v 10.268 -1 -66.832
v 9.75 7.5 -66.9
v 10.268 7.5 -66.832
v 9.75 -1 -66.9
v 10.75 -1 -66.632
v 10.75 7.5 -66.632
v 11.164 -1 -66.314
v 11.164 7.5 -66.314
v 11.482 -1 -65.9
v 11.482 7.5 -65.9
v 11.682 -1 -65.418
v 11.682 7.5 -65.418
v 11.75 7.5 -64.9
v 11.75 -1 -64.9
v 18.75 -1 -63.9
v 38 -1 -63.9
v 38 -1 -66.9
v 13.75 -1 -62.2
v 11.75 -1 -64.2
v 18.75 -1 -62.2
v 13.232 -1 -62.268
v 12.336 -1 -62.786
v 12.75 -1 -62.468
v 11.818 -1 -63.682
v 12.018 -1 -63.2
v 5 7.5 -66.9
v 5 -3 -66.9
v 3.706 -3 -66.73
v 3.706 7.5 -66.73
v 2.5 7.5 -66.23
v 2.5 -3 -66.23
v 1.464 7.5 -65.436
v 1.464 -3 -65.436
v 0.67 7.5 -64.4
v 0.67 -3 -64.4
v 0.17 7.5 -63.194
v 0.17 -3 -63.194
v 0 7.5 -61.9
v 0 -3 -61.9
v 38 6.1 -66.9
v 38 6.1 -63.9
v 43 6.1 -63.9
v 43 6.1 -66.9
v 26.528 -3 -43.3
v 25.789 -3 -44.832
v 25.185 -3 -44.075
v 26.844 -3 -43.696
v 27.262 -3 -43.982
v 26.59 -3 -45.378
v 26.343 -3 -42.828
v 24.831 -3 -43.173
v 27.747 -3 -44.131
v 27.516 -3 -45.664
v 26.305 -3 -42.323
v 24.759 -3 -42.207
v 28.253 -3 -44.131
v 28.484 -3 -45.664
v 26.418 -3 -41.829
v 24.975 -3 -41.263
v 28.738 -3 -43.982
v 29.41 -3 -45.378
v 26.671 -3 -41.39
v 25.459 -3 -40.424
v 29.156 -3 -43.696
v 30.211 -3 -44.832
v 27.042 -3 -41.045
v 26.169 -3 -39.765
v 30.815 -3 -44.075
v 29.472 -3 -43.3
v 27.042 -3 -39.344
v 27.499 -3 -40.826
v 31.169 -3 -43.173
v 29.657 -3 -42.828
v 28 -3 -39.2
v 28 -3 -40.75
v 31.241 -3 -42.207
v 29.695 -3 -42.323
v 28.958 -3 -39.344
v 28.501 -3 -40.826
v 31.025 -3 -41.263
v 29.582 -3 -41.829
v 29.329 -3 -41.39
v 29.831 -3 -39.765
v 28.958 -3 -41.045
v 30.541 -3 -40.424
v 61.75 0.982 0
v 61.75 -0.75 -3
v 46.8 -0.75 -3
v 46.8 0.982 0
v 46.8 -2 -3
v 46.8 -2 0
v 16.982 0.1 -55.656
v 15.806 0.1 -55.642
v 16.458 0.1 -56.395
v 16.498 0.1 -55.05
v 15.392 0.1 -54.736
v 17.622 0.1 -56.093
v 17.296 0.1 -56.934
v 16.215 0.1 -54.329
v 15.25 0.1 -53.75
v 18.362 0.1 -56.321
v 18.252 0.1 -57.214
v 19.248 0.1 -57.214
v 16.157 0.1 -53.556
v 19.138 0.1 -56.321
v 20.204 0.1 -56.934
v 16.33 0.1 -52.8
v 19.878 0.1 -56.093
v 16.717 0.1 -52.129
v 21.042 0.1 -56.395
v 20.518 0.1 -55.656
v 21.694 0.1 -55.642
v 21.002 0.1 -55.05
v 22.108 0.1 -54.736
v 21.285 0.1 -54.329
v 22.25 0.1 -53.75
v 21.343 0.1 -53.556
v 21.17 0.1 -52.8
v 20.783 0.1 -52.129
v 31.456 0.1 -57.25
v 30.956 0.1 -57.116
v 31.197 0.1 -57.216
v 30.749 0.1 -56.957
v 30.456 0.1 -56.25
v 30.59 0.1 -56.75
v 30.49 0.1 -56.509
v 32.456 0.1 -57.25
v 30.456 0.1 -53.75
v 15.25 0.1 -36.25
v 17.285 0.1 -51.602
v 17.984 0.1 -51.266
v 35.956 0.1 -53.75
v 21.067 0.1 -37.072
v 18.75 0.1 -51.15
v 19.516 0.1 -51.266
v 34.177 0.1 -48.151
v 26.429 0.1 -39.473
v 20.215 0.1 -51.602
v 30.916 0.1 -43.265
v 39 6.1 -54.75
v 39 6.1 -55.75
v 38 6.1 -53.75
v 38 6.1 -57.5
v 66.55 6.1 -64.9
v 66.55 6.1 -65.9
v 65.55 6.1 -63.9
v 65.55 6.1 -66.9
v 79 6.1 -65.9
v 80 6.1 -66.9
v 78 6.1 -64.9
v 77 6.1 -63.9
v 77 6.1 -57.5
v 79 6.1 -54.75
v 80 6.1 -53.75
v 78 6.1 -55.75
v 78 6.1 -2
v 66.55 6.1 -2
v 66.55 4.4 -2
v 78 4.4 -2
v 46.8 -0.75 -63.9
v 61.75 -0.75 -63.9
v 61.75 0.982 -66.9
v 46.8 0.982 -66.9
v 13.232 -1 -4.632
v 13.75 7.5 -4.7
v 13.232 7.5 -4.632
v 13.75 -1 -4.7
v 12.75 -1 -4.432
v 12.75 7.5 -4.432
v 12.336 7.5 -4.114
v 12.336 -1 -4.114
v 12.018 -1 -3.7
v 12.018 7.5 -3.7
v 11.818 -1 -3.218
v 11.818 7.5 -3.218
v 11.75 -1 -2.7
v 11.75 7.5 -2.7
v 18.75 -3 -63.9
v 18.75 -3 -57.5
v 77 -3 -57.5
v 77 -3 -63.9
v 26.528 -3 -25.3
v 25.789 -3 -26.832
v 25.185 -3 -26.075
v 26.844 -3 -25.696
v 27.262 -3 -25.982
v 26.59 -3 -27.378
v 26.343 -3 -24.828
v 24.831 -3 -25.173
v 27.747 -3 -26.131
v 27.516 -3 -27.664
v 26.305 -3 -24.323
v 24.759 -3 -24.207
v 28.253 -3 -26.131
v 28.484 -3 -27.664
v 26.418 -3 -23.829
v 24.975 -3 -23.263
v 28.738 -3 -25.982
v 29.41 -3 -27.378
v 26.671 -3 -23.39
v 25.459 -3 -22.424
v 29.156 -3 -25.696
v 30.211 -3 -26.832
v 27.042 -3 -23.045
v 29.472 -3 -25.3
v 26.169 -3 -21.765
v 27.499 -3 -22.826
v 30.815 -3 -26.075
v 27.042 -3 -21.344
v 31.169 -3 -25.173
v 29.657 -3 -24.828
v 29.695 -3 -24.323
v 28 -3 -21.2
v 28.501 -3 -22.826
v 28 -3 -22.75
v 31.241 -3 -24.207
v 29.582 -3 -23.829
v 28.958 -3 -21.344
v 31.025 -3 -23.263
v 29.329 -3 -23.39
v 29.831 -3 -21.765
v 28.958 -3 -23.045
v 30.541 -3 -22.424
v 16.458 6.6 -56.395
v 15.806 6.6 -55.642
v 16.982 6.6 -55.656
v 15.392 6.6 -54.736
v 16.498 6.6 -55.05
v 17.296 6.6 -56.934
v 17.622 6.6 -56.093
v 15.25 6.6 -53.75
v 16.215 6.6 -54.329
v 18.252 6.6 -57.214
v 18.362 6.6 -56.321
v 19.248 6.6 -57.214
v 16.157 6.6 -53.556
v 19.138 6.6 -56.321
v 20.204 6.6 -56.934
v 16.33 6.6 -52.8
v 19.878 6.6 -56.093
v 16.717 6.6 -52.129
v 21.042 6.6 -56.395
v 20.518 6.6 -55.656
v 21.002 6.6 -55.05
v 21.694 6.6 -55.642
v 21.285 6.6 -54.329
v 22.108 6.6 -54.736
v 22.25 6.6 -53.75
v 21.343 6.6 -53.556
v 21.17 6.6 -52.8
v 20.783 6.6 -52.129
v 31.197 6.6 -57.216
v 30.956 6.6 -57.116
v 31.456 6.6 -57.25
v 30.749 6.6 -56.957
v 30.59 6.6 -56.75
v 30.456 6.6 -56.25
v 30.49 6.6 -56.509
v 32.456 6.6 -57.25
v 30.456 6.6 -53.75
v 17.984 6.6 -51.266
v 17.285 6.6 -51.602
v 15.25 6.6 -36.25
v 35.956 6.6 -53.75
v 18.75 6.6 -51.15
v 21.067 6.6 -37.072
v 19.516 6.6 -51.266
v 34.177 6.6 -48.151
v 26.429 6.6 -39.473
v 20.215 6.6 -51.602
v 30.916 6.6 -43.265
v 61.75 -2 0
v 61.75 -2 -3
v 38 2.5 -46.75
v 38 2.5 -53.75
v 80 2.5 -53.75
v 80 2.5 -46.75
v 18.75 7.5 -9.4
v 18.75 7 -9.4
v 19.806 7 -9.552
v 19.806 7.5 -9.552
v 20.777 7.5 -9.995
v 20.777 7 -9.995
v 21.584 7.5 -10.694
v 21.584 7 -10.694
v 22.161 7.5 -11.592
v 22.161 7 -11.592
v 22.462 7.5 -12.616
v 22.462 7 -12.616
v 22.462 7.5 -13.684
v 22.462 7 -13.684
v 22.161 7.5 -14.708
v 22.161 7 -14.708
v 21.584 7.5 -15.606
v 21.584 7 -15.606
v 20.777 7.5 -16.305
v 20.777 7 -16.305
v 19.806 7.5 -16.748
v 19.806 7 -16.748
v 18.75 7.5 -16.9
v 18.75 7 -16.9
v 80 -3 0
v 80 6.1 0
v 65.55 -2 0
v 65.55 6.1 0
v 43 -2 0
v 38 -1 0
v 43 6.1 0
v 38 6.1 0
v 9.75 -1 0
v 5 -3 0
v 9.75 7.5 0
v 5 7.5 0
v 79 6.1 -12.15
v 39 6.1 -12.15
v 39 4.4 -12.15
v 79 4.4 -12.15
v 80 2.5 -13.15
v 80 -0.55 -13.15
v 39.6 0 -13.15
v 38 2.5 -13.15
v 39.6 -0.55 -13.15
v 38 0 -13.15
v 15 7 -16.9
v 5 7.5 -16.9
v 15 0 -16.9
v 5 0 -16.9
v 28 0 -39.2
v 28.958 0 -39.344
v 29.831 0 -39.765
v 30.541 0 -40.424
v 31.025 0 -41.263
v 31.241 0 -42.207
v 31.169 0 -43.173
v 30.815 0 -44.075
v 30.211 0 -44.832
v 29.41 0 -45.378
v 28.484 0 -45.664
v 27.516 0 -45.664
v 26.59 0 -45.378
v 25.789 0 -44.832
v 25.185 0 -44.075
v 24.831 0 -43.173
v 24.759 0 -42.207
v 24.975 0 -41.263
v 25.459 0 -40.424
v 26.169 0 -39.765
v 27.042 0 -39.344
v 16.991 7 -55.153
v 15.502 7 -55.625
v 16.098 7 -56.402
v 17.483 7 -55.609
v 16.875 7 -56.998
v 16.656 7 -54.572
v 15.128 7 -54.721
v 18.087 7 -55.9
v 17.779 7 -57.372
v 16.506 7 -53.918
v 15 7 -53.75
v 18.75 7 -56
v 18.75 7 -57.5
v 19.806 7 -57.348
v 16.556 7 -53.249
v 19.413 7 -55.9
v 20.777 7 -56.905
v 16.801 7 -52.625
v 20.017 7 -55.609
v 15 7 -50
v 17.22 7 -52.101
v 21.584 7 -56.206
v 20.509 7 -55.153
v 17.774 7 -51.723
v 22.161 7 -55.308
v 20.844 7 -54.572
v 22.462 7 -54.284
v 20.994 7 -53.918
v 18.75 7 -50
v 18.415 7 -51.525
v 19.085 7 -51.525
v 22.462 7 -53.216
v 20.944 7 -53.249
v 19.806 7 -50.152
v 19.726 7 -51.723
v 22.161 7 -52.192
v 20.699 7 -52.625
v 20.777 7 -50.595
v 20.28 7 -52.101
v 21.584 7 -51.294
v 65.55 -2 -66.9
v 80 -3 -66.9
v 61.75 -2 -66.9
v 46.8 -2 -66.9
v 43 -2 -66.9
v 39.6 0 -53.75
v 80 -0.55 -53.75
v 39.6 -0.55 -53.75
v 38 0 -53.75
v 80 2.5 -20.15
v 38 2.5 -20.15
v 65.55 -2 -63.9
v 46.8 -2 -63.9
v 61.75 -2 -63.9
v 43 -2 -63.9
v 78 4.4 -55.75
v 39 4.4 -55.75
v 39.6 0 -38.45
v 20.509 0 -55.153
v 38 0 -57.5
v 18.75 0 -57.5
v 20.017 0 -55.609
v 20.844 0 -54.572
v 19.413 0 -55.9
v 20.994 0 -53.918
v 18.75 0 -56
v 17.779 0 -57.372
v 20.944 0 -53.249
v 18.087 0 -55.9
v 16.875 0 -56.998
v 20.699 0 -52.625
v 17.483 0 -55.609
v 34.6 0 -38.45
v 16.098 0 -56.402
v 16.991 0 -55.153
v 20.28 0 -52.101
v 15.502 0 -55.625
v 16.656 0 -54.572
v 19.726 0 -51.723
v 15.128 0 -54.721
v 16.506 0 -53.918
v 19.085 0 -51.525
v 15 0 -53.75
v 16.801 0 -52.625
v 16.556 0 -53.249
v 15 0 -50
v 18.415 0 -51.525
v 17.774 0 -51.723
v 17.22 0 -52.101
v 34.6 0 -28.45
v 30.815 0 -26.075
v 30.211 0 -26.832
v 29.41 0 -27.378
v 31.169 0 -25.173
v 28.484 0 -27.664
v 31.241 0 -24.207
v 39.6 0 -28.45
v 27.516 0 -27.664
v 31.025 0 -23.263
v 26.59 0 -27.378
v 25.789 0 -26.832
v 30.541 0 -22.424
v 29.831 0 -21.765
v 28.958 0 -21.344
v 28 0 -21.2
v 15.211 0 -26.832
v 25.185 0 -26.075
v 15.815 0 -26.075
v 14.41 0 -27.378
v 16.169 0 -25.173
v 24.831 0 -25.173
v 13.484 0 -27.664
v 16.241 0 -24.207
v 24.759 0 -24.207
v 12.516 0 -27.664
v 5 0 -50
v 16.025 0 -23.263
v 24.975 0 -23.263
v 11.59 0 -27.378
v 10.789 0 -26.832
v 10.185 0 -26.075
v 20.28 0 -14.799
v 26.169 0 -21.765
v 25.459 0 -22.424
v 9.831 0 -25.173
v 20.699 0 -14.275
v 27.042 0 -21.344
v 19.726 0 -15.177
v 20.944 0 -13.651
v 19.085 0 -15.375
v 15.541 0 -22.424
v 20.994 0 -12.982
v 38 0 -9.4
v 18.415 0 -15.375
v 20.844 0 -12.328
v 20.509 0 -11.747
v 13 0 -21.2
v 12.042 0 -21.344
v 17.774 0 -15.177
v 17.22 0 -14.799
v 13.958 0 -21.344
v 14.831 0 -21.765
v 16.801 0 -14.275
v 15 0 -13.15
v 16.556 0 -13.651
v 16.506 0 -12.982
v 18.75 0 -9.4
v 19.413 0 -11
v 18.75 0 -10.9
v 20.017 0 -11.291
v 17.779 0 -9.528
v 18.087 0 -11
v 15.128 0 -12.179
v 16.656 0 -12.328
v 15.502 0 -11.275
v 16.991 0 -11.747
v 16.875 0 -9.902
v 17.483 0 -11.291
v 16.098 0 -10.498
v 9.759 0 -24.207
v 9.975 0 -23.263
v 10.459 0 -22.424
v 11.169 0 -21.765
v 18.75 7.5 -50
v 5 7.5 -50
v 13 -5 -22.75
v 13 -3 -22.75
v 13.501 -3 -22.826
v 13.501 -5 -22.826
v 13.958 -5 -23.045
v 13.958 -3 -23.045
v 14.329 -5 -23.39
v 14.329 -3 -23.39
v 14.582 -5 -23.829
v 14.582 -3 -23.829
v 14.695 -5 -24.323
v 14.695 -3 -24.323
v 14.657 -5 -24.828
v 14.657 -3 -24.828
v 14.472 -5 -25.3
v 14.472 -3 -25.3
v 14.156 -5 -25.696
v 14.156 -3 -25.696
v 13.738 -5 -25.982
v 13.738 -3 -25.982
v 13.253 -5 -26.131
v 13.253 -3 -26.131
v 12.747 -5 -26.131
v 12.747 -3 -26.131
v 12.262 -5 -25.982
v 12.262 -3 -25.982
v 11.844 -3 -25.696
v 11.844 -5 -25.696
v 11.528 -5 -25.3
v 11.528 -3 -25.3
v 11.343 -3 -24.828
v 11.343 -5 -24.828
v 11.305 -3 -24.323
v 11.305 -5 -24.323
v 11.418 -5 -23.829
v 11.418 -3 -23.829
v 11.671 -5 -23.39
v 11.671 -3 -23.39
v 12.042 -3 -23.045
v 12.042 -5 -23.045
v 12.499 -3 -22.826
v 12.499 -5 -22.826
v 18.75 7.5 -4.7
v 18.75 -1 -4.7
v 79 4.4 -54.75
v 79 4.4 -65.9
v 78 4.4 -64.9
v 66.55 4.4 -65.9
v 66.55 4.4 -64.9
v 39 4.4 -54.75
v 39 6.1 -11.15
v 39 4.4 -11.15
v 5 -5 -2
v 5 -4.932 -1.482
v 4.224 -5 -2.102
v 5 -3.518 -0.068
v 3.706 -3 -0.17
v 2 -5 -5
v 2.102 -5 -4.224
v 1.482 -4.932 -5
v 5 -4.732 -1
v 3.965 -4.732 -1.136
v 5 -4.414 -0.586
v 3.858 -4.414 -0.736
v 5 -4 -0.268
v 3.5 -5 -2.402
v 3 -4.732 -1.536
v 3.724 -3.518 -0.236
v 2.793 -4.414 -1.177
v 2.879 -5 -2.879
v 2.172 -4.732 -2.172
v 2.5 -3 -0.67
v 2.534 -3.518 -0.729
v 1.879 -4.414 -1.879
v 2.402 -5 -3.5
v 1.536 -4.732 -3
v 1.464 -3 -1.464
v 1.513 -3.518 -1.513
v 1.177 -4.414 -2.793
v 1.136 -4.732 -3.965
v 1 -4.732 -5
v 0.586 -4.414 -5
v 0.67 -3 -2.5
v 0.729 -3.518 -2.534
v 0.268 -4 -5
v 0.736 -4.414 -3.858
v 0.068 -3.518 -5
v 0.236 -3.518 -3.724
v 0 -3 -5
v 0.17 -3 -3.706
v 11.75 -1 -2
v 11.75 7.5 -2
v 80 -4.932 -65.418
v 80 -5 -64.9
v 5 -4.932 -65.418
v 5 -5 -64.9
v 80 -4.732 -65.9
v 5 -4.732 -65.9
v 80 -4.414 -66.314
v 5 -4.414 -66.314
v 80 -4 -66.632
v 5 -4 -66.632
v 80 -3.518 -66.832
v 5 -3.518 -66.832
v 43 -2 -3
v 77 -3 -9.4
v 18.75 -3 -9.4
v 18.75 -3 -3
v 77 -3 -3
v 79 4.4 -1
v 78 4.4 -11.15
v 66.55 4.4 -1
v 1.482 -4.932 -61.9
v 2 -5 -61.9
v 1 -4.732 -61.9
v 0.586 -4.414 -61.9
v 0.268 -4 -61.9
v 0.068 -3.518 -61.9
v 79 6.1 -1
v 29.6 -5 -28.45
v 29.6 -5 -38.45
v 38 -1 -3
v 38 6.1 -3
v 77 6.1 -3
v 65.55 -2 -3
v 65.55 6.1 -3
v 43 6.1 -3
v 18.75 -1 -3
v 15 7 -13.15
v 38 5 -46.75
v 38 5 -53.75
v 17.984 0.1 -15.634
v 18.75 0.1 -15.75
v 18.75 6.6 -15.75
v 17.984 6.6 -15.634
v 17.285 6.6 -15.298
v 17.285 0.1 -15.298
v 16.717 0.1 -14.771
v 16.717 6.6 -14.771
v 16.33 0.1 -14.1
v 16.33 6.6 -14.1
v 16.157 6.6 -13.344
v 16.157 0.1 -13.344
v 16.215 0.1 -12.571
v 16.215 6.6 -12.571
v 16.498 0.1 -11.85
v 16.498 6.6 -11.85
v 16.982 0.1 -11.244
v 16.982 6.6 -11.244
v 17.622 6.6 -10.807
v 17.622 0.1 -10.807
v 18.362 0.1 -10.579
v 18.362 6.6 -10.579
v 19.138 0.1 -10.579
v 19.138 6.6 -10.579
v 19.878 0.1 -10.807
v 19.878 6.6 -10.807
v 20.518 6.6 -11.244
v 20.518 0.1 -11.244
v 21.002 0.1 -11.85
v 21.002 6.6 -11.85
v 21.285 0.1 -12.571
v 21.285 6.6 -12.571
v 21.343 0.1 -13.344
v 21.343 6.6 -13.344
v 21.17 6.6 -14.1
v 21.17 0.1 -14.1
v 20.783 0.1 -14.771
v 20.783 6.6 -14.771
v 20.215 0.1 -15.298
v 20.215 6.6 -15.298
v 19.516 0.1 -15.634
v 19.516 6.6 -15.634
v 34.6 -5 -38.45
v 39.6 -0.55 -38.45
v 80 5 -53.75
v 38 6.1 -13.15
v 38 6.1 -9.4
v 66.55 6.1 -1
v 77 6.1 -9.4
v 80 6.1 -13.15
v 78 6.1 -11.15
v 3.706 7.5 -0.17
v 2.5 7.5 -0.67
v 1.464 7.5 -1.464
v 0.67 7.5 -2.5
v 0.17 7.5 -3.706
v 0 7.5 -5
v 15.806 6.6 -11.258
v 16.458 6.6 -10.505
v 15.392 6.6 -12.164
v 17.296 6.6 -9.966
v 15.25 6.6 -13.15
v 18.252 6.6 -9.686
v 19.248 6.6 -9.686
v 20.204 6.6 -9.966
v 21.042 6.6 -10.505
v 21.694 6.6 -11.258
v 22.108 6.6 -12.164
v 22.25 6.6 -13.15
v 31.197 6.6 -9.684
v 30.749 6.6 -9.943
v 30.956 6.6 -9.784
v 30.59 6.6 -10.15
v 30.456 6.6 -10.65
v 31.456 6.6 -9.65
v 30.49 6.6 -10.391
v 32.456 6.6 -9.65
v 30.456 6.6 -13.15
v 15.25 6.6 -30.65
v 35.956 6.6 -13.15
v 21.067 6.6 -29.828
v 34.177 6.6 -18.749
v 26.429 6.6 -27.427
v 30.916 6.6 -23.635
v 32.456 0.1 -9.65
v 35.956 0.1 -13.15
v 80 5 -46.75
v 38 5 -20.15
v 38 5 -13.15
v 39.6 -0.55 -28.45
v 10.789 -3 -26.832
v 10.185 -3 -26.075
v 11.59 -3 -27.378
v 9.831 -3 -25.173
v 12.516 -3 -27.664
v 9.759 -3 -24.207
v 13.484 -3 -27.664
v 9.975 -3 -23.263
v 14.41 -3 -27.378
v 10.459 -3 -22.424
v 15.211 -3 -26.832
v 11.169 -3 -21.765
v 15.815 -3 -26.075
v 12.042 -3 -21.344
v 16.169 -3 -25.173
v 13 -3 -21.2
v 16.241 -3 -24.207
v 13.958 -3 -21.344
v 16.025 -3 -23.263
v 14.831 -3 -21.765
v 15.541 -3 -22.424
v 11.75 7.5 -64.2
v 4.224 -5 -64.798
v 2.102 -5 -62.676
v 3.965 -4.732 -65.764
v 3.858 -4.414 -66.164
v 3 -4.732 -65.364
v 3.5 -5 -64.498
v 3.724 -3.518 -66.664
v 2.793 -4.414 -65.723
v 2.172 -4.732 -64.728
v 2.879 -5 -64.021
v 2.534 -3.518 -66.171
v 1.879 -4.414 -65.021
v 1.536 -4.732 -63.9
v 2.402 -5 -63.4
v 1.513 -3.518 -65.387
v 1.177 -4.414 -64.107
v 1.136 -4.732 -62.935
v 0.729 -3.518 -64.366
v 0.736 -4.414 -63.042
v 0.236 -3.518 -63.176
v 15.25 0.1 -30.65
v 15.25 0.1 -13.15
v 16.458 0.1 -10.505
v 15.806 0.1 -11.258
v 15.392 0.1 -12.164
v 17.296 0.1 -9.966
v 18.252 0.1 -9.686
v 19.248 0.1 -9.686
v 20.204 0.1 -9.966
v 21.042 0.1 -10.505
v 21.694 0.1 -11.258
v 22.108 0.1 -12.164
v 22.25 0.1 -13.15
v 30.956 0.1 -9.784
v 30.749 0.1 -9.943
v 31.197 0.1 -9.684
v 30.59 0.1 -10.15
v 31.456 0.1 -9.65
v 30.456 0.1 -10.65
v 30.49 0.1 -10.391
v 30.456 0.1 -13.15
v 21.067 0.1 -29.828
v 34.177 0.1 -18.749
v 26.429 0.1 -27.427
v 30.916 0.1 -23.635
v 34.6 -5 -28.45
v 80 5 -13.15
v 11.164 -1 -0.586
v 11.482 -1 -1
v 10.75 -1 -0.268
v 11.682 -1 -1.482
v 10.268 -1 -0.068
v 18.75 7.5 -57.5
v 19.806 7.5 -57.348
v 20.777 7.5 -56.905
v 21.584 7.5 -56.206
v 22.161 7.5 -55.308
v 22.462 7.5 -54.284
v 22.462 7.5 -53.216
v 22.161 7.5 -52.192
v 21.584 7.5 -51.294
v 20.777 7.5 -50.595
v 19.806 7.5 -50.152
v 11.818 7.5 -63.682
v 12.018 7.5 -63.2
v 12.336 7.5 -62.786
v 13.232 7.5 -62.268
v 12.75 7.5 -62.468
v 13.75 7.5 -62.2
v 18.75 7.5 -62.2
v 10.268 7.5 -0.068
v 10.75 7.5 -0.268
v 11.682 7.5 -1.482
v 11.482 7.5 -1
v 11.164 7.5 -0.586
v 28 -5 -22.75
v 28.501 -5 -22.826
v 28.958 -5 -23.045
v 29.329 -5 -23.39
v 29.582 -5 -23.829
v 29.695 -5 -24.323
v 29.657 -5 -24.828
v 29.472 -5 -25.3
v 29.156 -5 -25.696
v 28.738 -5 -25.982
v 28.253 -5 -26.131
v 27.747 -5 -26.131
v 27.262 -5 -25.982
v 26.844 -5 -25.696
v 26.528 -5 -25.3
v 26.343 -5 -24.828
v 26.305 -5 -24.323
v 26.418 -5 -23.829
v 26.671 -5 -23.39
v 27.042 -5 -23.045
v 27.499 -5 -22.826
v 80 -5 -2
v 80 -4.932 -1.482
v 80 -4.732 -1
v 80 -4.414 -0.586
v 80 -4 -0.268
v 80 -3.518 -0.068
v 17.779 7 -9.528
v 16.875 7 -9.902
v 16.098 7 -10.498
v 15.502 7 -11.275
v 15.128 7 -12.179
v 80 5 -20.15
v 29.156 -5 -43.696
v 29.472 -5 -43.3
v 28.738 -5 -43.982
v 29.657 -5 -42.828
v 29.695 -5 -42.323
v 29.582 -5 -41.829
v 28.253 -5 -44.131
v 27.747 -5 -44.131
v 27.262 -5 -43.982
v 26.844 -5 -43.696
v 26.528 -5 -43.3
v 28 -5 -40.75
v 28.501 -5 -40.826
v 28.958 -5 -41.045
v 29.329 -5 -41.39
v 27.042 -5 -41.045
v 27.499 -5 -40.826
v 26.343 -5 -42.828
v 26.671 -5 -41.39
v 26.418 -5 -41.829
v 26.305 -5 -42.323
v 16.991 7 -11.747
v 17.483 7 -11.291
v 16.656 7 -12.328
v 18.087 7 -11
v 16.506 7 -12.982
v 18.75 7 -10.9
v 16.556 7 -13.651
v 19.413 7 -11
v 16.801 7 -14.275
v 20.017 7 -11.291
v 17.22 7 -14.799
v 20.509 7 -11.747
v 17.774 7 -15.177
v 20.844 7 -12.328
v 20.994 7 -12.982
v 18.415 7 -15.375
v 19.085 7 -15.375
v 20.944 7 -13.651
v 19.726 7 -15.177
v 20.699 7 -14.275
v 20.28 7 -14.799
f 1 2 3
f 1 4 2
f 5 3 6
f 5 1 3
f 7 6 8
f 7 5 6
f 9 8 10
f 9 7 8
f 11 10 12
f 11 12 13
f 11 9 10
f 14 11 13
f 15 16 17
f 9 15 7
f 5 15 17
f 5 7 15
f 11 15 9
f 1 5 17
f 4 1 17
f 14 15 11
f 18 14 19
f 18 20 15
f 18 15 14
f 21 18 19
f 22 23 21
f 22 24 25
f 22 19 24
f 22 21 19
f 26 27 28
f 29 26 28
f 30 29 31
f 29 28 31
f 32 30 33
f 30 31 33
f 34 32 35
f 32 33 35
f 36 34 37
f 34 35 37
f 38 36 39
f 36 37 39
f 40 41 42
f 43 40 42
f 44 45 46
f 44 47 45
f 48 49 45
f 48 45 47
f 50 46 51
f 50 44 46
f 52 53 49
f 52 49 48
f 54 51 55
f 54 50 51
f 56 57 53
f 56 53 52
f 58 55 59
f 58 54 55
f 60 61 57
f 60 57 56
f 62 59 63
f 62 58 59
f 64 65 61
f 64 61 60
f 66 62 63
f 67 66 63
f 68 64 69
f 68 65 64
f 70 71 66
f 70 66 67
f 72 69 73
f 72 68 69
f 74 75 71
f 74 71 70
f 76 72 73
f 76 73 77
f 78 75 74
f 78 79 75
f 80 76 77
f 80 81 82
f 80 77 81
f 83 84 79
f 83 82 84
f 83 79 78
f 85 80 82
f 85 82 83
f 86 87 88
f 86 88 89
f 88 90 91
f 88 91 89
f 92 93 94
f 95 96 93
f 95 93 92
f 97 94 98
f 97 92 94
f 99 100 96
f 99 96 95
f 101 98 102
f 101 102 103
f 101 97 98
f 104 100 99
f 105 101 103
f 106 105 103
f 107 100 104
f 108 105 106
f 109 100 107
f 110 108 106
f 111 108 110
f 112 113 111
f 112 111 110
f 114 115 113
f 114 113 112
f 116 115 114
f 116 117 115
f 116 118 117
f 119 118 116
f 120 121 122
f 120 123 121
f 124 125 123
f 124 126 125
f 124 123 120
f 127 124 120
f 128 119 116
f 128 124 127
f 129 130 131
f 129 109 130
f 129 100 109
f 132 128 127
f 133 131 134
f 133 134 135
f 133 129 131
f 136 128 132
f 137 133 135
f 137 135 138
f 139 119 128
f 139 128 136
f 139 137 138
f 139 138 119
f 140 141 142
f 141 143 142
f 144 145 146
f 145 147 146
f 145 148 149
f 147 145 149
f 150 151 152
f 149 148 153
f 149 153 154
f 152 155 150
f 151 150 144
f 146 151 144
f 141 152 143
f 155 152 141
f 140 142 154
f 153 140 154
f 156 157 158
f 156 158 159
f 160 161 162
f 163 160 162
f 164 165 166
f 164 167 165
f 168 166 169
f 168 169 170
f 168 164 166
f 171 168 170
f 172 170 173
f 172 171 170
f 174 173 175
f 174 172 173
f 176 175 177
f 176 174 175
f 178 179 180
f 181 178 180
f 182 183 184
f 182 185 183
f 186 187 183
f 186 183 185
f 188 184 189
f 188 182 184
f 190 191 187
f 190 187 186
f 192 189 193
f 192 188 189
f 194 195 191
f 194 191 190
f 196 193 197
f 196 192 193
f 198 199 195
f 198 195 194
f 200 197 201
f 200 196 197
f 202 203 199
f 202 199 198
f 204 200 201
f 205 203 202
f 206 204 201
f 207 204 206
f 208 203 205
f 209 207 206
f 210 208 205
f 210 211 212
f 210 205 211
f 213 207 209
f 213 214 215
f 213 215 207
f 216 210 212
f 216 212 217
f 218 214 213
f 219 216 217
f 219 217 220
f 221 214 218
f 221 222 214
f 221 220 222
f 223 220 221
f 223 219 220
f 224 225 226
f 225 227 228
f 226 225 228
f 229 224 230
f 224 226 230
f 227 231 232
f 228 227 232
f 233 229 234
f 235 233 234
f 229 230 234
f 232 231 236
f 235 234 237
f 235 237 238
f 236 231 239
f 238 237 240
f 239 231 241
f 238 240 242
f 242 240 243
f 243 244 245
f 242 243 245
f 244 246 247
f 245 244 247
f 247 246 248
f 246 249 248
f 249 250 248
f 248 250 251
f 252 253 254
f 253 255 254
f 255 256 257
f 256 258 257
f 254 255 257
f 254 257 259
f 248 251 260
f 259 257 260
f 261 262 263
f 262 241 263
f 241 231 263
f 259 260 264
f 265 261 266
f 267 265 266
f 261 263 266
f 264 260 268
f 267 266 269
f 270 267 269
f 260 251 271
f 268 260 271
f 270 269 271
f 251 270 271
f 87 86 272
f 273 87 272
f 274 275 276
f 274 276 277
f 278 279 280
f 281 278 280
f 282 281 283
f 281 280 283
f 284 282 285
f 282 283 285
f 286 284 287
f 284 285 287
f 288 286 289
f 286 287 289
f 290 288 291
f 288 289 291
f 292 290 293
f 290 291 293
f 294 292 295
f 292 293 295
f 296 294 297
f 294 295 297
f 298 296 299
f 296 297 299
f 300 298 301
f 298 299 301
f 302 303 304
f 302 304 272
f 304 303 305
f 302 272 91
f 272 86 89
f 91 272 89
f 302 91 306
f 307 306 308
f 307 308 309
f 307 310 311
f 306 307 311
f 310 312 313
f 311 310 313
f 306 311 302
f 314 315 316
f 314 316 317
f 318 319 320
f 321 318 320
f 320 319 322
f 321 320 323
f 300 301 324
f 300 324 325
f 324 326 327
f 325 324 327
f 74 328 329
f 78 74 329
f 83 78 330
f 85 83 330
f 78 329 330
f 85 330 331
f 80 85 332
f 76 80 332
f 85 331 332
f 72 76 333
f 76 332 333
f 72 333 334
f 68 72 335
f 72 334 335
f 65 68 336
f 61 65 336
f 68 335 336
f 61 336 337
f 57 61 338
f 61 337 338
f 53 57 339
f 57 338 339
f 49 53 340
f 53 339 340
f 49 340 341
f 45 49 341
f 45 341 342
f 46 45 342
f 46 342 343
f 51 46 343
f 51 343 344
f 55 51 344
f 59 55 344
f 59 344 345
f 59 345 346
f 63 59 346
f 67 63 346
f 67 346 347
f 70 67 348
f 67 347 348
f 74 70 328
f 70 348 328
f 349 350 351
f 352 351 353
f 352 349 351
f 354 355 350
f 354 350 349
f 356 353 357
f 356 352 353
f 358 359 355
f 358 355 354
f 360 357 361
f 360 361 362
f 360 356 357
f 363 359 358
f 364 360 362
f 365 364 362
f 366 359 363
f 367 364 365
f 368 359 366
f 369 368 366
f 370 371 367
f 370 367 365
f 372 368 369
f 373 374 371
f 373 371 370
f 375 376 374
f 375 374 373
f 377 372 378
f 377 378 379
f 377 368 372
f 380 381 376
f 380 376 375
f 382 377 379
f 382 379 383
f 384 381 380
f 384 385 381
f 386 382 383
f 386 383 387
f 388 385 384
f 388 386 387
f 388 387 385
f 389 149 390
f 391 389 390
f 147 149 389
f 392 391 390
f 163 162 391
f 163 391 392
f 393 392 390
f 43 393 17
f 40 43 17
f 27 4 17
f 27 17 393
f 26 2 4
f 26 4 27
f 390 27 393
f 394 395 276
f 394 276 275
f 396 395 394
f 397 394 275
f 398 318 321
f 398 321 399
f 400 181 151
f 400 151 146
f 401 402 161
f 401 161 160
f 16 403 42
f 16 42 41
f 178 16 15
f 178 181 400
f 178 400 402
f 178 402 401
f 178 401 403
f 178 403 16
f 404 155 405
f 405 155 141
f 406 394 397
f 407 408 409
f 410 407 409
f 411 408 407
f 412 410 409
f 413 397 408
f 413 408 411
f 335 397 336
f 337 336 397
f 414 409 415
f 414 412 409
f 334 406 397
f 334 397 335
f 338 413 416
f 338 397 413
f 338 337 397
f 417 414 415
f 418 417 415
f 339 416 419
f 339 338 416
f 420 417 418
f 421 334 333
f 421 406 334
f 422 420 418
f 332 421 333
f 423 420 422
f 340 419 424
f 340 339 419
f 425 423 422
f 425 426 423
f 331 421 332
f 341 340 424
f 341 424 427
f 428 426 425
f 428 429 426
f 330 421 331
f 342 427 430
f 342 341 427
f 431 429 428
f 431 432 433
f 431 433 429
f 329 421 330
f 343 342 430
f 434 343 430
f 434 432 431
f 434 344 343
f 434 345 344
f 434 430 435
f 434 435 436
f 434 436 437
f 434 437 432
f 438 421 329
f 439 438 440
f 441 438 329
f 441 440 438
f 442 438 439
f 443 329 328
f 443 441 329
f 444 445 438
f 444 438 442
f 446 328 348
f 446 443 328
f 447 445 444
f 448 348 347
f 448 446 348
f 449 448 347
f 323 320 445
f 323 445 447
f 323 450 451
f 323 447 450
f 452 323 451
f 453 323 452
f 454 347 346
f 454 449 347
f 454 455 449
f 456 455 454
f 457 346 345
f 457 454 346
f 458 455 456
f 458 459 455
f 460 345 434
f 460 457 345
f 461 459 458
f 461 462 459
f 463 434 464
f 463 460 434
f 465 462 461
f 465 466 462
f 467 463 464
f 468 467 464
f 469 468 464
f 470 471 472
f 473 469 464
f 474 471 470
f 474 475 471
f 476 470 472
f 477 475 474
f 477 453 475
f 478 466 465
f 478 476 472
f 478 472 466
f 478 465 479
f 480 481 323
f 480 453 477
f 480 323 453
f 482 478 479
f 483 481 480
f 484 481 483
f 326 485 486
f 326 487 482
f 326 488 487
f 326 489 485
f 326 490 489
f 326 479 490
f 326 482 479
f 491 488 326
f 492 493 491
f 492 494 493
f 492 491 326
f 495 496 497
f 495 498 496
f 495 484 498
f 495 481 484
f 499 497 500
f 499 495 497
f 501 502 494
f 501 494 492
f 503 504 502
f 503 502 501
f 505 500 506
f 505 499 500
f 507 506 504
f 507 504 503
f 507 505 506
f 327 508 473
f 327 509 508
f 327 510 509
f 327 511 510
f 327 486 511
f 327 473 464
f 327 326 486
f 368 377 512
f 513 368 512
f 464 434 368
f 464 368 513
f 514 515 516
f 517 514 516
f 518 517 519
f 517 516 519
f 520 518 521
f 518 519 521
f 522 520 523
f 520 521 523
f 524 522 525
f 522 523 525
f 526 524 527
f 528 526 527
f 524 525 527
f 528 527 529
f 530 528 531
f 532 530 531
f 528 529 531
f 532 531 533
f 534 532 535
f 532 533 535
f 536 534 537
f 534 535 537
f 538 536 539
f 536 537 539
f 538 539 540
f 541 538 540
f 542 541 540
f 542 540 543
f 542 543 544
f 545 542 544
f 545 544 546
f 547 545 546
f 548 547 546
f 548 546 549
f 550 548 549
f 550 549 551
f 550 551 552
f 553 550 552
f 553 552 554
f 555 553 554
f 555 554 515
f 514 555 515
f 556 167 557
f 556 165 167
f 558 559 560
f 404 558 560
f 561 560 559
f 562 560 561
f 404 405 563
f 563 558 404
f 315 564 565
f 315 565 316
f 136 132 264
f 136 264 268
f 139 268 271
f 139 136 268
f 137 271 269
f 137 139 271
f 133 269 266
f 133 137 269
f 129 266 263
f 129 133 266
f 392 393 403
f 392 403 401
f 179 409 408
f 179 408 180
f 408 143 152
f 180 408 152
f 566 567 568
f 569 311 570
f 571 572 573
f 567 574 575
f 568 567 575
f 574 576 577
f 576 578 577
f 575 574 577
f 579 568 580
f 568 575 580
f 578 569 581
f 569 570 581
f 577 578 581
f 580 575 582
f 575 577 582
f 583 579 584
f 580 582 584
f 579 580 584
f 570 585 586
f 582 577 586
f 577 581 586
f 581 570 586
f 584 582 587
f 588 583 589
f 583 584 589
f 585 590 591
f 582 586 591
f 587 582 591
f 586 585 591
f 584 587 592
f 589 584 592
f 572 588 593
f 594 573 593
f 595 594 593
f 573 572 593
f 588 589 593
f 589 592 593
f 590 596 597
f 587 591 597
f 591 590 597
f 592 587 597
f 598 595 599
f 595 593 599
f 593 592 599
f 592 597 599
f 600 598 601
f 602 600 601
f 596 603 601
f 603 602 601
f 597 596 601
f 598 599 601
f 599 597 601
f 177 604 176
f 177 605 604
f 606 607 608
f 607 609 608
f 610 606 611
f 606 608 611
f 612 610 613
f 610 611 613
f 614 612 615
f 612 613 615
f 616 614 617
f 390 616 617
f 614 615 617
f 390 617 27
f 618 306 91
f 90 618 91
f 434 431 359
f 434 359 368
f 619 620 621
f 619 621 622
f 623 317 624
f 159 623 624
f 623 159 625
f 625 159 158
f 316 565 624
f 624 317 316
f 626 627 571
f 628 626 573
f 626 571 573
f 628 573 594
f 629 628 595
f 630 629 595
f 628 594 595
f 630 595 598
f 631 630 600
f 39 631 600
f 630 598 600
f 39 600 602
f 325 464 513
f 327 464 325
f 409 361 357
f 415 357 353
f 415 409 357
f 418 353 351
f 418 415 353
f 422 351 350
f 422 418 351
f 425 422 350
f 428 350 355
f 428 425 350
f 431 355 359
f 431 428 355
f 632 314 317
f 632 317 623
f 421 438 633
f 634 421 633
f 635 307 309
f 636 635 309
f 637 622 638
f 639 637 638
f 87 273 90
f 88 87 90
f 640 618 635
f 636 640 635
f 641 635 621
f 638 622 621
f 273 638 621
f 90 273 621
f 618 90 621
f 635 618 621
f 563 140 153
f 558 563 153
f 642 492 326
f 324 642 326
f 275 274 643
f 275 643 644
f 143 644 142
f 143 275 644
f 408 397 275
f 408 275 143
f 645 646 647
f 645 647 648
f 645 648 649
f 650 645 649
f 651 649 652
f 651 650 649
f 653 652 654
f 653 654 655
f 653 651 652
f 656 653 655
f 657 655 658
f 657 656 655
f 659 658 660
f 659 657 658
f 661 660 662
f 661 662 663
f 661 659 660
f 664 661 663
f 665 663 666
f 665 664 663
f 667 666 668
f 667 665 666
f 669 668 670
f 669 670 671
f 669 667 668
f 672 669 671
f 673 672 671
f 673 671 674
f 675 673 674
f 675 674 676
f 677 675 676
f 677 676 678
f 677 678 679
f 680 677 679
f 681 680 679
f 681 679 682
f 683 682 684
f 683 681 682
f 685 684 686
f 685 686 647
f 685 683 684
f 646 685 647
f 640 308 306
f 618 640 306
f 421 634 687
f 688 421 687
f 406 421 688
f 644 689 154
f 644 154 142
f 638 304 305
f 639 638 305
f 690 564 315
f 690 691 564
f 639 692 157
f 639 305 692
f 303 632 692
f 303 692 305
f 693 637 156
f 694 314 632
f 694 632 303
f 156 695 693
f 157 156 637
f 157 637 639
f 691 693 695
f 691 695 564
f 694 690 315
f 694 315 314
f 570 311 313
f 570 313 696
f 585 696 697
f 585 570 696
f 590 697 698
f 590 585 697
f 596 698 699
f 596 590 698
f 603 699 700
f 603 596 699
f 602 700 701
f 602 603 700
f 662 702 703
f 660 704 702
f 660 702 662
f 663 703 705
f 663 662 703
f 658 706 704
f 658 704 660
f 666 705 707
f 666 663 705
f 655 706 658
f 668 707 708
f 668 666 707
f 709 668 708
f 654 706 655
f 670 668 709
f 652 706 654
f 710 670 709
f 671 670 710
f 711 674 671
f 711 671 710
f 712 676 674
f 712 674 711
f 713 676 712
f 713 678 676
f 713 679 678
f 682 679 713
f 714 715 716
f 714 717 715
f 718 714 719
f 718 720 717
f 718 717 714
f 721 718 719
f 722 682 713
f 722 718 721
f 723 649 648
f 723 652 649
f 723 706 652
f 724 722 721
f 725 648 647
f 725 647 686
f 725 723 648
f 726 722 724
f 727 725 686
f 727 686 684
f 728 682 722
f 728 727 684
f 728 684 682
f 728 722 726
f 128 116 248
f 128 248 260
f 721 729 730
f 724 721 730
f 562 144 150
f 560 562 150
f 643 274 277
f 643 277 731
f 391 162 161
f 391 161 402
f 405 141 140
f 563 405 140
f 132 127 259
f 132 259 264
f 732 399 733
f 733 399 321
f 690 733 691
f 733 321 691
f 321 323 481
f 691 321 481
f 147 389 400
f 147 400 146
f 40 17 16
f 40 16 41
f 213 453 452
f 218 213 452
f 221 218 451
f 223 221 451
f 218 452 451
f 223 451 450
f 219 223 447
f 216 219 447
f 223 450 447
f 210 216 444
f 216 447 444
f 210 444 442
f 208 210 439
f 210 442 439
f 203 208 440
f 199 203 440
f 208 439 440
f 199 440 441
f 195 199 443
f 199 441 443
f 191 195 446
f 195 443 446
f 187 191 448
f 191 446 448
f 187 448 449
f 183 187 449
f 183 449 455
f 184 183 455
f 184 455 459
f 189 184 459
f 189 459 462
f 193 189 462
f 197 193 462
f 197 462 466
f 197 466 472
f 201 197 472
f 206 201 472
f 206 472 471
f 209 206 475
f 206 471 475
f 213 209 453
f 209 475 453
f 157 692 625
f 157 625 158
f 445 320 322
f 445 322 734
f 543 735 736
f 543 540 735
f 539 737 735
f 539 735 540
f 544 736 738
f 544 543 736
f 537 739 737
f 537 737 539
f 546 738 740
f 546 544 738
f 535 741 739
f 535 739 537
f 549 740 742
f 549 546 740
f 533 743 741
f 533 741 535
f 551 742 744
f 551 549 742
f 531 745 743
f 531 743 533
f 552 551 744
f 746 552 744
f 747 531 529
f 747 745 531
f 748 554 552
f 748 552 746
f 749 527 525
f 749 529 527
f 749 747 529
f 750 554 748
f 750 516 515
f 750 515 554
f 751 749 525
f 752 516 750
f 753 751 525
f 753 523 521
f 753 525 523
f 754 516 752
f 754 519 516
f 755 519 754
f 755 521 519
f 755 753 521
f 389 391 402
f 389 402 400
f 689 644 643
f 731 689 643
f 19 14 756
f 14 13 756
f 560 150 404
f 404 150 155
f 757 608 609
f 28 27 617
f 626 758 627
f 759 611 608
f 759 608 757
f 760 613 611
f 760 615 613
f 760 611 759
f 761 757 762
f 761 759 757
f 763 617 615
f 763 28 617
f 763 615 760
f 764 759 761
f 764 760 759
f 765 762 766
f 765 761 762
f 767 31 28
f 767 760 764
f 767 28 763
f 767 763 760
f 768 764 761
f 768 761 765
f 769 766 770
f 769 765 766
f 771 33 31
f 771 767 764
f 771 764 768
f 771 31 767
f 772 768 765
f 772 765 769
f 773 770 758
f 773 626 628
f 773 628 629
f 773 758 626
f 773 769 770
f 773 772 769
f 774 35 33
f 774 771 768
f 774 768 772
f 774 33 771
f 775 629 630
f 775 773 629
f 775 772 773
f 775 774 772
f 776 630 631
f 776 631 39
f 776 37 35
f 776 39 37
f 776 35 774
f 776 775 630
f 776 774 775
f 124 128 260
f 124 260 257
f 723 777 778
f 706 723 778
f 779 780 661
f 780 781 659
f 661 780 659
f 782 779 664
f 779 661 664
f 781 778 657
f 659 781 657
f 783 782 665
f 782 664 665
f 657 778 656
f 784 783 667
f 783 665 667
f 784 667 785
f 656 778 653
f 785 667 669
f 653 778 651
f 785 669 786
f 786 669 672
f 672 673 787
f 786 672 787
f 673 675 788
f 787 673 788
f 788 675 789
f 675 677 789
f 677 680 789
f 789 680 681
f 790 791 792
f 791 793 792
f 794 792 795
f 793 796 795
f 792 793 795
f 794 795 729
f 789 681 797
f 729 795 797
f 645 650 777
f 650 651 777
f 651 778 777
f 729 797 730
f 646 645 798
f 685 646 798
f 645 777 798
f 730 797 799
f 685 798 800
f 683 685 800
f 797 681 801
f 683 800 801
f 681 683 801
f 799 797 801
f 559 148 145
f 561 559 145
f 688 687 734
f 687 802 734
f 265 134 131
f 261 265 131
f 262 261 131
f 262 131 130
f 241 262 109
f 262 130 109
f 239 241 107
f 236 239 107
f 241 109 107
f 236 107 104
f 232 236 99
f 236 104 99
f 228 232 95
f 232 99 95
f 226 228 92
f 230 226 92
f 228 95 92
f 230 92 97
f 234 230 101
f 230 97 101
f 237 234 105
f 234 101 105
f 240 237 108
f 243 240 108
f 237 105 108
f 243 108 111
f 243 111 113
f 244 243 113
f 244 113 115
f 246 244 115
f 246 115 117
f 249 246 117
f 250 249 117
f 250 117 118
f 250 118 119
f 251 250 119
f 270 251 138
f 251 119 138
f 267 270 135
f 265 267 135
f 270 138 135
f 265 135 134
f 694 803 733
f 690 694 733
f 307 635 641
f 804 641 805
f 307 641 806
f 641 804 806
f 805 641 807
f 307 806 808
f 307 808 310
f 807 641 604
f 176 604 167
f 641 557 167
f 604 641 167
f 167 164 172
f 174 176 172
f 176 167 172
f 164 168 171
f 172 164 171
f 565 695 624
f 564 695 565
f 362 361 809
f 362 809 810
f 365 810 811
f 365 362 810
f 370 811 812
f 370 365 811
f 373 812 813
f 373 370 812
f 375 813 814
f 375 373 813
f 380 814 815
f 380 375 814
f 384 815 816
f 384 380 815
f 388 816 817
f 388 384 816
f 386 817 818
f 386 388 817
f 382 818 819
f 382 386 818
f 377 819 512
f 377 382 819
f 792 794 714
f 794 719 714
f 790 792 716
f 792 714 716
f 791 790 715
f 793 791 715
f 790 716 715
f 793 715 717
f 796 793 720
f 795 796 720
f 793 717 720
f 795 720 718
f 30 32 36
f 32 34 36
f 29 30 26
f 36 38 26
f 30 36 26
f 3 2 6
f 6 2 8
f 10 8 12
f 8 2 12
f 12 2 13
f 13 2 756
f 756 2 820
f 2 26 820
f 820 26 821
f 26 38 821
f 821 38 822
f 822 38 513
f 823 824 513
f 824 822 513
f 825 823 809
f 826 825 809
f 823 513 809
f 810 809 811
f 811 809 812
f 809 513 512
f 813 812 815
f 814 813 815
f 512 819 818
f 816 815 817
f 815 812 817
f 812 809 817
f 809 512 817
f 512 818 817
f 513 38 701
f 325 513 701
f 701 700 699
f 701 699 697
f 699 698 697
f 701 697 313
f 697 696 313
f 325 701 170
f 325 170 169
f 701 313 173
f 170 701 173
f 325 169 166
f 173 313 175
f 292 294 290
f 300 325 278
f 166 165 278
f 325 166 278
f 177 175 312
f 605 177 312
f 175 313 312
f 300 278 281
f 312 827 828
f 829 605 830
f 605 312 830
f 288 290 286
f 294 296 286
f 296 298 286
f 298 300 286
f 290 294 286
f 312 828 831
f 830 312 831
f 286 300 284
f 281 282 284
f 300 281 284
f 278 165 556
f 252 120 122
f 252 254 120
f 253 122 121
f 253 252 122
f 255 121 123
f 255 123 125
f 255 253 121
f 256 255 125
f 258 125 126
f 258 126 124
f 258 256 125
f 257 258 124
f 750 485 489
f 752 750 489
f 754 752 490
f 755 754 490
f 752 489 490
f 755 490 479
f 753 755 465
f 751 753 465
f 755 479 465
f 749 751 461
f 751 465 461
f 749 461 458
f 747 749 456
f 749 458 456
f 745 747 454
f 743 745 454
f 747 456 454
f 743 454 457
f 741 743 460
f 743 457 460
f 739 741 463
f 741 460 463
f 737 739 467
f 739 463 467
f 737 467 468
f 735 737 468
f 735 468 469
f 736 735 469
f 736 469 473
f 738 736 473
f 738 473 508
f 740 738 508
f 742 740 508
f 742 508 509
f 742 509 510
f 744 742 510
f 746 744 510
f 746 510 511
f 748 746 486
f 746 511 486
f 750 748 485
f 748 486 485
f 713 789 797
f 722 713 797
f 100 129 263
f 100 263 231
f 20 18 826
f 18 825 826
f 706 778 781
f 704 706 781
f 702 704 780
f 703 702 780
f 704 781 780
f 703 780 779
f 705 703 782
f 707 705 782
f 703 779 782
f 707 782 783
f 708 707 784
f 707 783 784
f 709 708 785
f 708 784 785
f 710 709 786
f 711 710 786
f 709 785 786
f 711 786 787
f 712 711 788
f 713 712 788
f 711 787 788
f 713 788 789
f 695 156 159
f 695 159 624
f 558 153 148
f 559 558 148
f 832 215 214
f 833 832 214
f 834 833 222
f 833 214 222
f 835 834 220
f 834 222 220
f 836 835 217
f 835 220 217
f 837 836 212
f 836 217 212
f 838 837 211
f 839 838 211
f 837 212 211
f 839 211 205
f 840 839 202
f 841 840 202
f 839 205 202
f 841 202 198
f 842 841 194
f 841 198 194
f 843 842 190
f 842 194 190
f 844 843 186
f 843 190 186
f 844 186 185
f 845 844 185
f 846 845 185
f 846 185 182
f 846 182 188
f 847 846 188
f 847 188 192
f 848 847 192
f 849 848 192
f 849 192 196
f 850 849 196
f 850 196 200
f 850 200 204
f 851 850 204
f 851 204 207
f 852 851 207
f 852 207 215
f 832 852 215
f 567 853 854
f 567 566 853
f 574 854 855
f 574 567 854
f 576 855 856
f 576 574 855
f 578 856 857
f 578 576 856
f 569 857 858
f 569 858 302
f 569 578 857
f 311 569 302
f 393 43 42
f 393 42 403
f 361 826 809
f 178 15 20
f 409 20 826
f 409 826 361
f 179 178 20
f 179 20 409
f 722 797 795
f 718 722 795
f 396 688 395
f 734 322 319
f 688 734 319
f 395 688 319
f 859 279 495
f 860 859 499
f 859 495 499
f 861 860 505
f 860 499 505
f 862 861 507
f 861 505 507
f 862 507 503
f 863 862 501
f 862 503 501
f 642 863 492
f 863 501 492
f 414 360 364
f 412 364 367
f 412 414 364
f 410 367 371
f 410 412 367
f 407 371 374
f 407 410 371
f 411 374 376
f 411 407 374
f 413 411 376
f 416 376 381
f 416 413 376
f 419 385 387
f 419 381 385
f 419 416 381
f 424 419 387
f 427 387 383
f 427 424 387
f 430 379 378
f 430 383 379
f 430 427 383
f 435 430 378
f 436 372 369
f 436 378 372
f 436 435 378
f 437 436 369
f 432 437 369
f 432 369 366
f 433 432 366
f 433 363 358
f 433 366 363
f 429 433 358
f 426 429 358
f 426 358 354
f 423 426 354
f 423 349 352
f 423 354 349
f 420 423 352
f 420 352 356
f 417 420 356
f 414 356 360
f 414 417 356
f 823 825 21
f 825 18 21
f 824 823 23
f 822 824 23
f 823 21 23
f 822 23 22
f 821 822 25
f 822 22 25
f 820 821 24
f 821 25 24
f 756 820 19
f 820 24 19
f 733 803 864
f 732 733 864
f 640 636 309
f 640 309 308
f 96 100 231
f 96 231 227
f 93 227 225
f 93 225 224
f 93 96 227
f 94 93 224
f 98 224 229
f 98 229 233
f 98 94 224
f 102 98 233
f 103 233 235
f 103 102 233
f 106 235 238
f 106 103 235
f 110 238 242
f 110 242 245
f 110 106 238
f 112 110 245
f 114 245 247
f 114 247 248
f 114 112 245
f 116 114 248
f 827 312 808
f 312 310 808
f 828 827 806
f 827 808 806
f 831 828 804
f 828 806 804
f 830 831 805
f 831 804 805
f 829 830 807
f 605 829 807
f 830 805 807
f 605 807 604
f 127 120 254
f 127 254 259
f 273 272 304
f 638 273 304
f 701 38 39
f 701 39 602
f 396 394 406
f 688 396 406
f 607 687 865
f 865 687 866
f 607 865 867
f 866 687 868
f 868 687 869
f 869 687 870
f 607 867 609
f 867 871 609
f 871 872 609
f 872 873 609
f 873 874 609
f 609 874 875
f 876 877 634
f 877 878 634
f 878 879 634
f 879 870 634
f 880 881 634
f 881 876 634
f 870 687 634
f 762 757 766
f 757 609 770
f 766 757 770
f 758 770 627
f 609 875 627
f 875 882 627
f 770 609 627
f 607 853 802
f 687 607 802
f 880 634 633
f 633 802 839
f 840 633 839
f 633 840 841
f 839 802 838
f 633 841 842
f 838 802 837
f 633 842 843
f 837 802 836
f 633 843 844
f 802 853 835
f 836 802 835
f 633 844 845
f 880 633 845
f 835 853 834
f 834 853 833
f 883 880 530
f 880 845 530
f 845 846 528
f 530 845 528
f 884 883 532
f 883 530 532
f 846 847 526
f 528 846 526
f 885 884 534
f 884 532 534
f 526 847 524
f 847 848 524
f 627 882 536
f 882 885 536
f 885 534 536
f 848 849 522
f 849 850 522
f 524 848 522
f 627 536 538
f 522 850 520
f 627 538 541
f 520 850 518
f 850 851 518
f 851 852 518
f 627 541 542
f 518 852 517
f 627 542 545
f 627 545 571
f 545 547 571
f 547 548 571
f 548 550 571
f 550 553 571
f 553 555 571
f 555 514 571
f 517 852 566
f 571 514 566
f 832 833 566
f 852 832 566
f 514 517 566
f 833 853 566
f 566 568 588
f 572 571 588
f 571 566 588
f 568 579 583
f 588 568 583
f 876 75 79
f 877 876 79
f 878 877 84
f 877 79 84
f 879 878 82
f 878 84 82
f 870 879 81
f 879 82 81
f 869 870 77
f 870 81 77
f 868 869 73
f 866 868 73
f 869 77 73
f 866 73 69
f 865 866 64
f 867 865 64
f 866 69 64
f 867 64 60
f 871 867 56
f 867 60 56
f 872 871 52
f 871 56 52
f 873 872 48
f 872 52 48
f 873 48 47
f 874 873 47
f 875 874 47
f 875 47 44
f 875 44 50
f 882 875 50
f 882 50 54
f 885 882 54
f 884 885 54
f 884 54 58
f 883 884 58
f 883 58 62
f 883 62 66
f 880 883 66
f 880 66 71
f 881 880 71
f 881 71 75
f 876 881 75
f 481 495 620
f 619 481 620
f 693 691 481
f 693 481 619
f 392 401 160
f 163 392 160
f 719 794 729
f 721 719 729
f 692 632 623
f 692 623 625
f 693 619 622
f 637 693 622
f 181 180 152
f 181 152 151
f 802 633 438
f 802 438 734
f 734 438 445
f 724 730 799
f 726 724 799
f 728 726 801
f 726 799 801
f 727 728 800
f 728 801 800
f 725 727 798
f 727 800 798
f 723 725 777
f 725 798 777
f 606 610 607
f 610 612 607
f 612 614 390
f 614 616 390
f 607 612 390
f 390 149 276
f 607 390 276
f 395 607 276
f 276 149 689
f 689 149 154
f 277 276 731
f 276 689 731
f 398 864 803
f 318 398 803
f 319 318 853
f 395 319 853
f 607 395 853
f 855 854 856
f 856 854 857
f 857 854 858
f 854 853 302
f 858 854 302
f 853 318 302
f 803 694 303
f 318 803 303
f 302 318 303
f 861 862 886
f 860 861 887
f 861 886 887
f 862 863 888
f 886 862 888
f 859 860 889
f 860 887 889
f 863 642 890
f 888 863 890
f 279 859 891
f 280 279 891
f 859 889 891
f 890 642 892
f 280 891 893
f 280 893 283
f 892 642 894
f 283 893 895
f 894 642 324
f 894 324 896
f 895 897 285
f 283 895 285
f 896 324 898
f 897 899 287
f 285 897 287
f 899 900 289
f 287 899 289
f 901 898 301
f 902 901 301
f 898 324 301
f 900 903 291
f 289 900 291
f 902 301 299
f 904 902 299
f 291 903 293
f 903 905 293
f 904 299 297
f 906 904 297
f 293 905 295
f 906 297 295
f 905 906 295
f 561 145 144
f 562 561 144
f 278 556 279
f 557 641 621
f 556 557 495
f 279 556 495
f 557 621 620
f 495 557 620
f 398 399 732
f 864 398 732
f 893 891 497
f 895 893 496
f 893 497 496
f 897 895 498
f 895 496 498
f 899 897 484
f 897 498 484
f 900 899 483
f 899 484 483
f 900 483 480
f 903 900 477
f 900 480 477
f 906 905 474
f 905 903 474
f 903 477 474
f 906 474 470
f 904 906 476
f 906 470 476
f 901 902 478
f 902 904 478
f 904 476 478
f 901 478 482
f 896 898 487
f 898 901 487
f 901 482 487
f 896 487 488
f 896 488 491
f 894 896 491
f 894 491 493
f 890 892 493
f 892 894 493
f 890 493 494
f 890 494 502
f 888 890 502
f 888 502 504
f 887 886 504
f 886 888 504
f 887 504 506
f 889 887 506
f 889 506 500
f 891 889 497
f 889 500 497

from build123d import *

# Parameters (mm, degrees)
SKETCH1_R           = 2.25
BOSS_EXTRUDE1_DEPTH = 7.5
SKETCH2_W           = 80
SKETCH2_H           = 33.45
BOSS_EXTRUDE2_DEPTH = 5
SKETCH3_W           = 19.25
SKETCH3_H           = 7.5
CUT_EXTRUDE1_DEPTH  = 3
SKETCH4_W           = 58.25
SKETCH4_H           = 6.4
CUT_EXTRUDE2_DEPTH  = 3
SKETCH5_W           = 7
SKETCH5_H           = 2.5
BOSS_EXTRUDE3_DEPTH = 42
SKETCH6_W           = 40.4
SKETCH6_H           = 20.3
CUT_EXTRUDE3_DEPTH  = 0.55
BOSS_EXTRUDE4_START = 0.1
SKETCH7_R           = 2.6
BOSS_EXTRUDE4_DEPTH = 6.5
BOSS_EXTRUDE5_START = -0.5
BOSS_EXTRUDE5_DEPTH = 0.5
SKETCH9_W           = 7
SKETCH9_H           = 4.7
CUT_EXTRUDE4_DEPTH  = 7.5
CUT_EXTRUDE5_DEPTH  = 1
FILLET2_R           = 2
FILLET3_R           = 1
FILLET4_R           = 5
FILLET5_R           = 2
CUT_EXTRUDE11_DEPTH = 5
CUT_EXTRUDE12_DEPTH = 14.95
SKETCH17_W          = 42
SKETCH17_H          = 13.15
CUT_EXTRUDE13_DEPTH = 1.4
CUT_EXTRUDE14_DEPTH = 1.7
SKETCH19_R          = 3.25
SKETCH19_R_2        = 1.7
CUT_EXTRUDE15_DEPTH = 3
SKETCH20_R          = 1.7
CUT_EXTRUDE16_DEPTH = 105.813453335


with BuildPart() as part:
    # Sketch1 → Boss-Extrude1 (new body)
    with BuildSketch(Plane(origin=(0, 0, 0), x_dir=(1, 0, 0), z_dir=(0, 1, 0))):
        with BuildLine():
            Line((5, 16.9), (5, 33.45))
            Line((5, 33.45), (0, 33.45))
            Line((0, 33.45), (0, 0))
            Line((0, 0), (80, 0))
            Line((80, 0), (80, 9.4))
            Line((80, 9.4), (77, 9.4))
            Line((77, 9.4), (77, 3))
            Line((77, 3), (18.75, 3))
            Line((18.75, 3), (18.75, 9.4))
            ThreePointArc((18.75, 9.4), (16.098349571, 10.498349571), (15, 13.15))
            Line((15, 13.15), (15, 16.9))
            Line((15, 16.9), (5, 16.9))
        make_face()
        with Locations(Location((18.75, 13.15, 0), (0, 0, 270))):
            Circle(SKETCH1_R)
        Polygon((80, 9.4), (80, 13.15), (38, 13.15), (38, 9.4), (77, 9.4), align=None)
    extrude(amount=BOSS_EXTRUDE1_DEPTH)

    # Sketch2 → Boss-Extrude2 (add)
    with BuildSketch(Plane(origin=(0, 0, 0), x_dir=(-1, 0, 0), z_dir=(0, -1, 0))):
        with Locations((-40, 16.725)):
            Rectangle(SKETCH2_W, SKETCH2_H)
    extrude(amount=BOSS_EXTRUDE2_DEPTH)

    # Sketch3 → Cut-Extrude1 (cut)
    with BuildSketch(Plane.XY):
        Polygon((65.55, 6.1), (43, 6.1), (43, -2), (46.8, -2), (46.8, 1.5), (61.75, 1.5), (61.75, -2), (65.55, -2), align=None)
        with Locations((28.375, 3.75)):
            Rectangle(SKETCH3_W, SKETCH3_H)
    extrude(amount=-CUT_EXTRUDE1_DEPTH, mode=Mode.SUBTRACT)

    # Sketch4 → Cut-Extrude2 (cut)
    with BuildSketch(Plane(origin=(0, 0, 0), x_dir=(1, 0, 0), z_dir=(0, 1, 0))):
        with Locations((47.875, 6.2)):
            Rectangle(SKETCH4_W, SKETCH4_H)
    extrude(amount=-CUT_EXTRUDE2_DEPTH, mode=Mode.SUBTRACT)

    # Sketch5 → Boss-Extrude3 (add)
    with BuildSketch(Plane(origin=(80, 0, 0), x_dir=(0, 0, -1), z_dir=(1, 0, 0))):
        with Locations((16.65, 3.75)):
            Rectangle(SKETCH5_W, SKETCH5_H)
    extrude(amount=-BOSS_EXTRUDE3_DEPTH)

    # Sketch6 → Cut-Extrude3 (cut)
    with BuildSketch(Plane(origin=(0, 0, 0), x_dir=(1, 0, 0), z_dir=(0, 1, 0))):
        with Locations((59.8, 23.3)):
            Rectangle(SKETCH6_W, SKETCH6_H)
    extrude(amount=-CUT_EXTRUDE3_DEPTH, mode=Mode.SUBTRACT)

    # Sketch8 → Boss-Extrude5 (add)
    with BuildSketch(Plane(origin=(0, 7.5, 0), x_dir=(1, 0, 0), z_dir=(0, 1, 0)).offset(BOSS_EXTRUDE5_START)):
        with BuildLine():
            Line((15, 16.9), (15, 13.15))
            ThreePointArc((15, 13.15), (21.401650429, 10.498349571), (18.75, 16.9))
            Line((18.75, 16.9), (15, 16.9))
        make_face()
    extrude(amount=BOSS_EXTRUDE5_DEPTH)

    # Sketch9 → Cut-Extrude4 (cut)
    with BuildSketch(Plane(origin=(0, 7.5, 0), x_dir=(1, 0, 0), z_dir=(0, 1, 0))):
        with Locations((15.25, 2.35)):
            Rectangle(SKETCH9_W, SKETCH9_H)
    extrude(amount=-CUT_EXTRUDE4_DEPTH, mode=Mode.SUBTRACT)

    # Sketch10 → Cut-Extrude5 (cut)
    with BuildSketch(Plane(origin=(0, 0, 0), x_dir=(1, 0, 0), z_dir=(0, 1, 0))):
        Polygon((18.75, 4.7), (18.75, 3), (38, 3), (38, 0), (11.75, 0), (11.75, 4.7), align=None)
    extrude(amount=-CUT_EXTRUDE5_DEPTH, mode=Mode.SUBTRACT)

    # Fillet2
    fillet2_edges = [part.edges().sort_by_distance(p)[0] for p in [
        (11.75, 3.25, -4.7),
        (11.75, 3.25, 0),
    ]]
    fillet(fillet2_edges, radius=FILLET2_R)

    # Fillet4
    fillet4_edges = [part.edges().sort_by_distance(p)[0] for p in [
        (0, 1.25, 0),
    ]]
    fillet(fillet4_edges, radius=FILLET4_R)

    # Fillet5
    fillet5_edges = [part.edges().sort_by_distance(p)[0] for p in [
        (0, -5, -19.225),
        (1.464466094, -5, -1.464466094),
        (42.5, -5, 0),
    ]]
    fillet(fillet5_edges, radius=FILLET5_R)

    # Sketch15 → Cut-Extrude11 (cut)
    with BuildSketch(Plane(origin=(0, 0, -33.45), x_dir=(-1, 0, 0), z_dir=(0, 0, -1))):
        Polygon((-39.6, 0), (-34.6, 0), (-29.6, -5), (-34.6, -5), (-39.6, -0.55), align=None)
    extrude(amount=-CUT_EXTRUDE11_DEPTH, mode=Mode.SUBTRACT)

    # Sketch16 → Cut-Extrude12 (cut)
    with BuildSketch(Plane.ZY.offset(-46.8)):
        Polygon((-3, -0.75), (0, 0.982050808), (0, 1.5), (-3, 1.5), align=None)
    extrude(amount=-CUT_EXTRUDE12_DEPTH, mode=Mode.SUBTRACT)

    # Sketch17 → Cut-Extrude13 (cut)
    with BuildSketch(Plane(origin=(0, 7.5, 0), x_dir=(1, 0, 0), z_dir=(0, 1, 0))):
        with Locations((59, 6.575)):
            Rectangle(SKETCH17_W, SKETCH17_H)
    extrude(amount=-CUT_EXTRUDE13_DEPTH, mode=Mode.SUBTRACT)

    # Sketch18 → Cut-Extrude14 (cut)
    with BuildSketch(Plane(origin=(0, 6.1, 0), x_dir=(1, 0, 0), z_dir=(0, 1, 0))):
        Polygon((78, 11.15), (39, 11.15), (39, 12.15), (79, 12.15), (79, 1), (66.55, 1), (66.55, 2), (78, 2), align=None)
    extrude(amount=-CUT_EXTRUDE14_DEPTH, mode=Mode.SUBTRACT)

    # Mirror1: part across plane


with BuildPart() as body_2:
    # Sketch7 → Boss-Extrude4 (new body)
    with BuildSketch(Plane(origin=(0, 0, 0), x_dir=(1, 0, 0), z_dir=(0, 1, 0)).offset(BOSS_EXTRUDE4_START)):
        with BuildLine():
            Line((15.25, 30.65), (15.25, 13.15))
            ThreePointArc((15.25, 13.15), (18.75, 9.65), (22.25, 13.15))
            Line((22.25, 13.15), (30.456279241, 13.15))
            Line((30.456279241, 13.15), (30.456279241, 9.65))
            Line((30.456279241, 9.65), (32.456279241, 9.65))
            Line((32.456279241, 9.65), (35.956279241, 13.15))
            ThreePointArc((35.956279241, 13.15), (28.805441712, 25.689014932), (15.25, 30.65))
        make_face()
        with Locations(Location((18.75, 13.15, 0), (0, 0, 90))):
            Circle(SKETCH7_R, mode=Mode.SUBTRACT)
    extrude(amount=BOSS_EXTRUDE4_DEPTH)

    # Fillet3
    fillet3_edges = [body_2.edges().sort_by_distance(p)[0] for p in [
        (30.456279241, 3.35, -9.65),
    ]]
    fillet(fillet3_edges, radius=FILLET3_R)


with BuildPart() as part_1:
    add(part.part)
    add(part.part.mirror(Plane(origin=(0, -5, -33.45), x_dir=(1, 0, 0), z_dir=(0, 0, 1))))

    # Sketch19 → Cut-Extrude15 (cut)
    # profile 1 of 6: a face of its own
    with BuildSketch(Plane(origin=(0, 0, 0), x_dir=(1, 0, 0), z_dir=(0, 1, 0))):
        with Locations(Location((28, 24.45, 0), (0, 0, 270))):
            Circle(SKETCH19_R)
        with Locations((28, 24.45)):
            Circle(SKETCH19_R_2, mode=Mode.SUBTRACT)
    # profile 2 of 6: a face of its own
    with BuildSketch(Plane(origin=(0, 0, 0), x_dir=(1, 0, 0), z_dir=(0, 1, 0))):
        with Locations(Location((13, 24.45, 0), (0, 0, 270))):
            Circle(SKETCH19_R)
        with Locations((13, 24.45)):
            Circle(SKETCH19_R_2, mode=Mode.SUBTRACT)
    # profile 3 of 6: a face of its own
    with BuildSketch(Plane(origin=(0, 0, 0), x_dir=(1, 0, 0), z_dir=(0, 1, 0))):
        with Locations((13, 24.45)):
            Circle(SKETCH19_R_2)
    # profile 4 of 6: a face of its own
    with BuildSketch(Plane(origin=(0, 0, 0), x_dir=(1, 0, 0), z_dir=(0, 1, 0))):
        with Locations((28, 24.45)):
            Circle(SKETCH19_R_2)
    # profile 5 of 6: a face of its own
    with BuildSketch(Plane(origin=(0, 0, 0), x_dir=(1, 0, 0), z_dir=(0, 1, 0))):
        with Locations(Location((28, 42.45, 0), (0, 0, 270))):
            Circle(SKETCH19_R)
        with Locations((28, 42.45)):
            Circle(SKETCH19_R_2, mode=Mode.SUBTRACT)
    # profile 6 of 6: a face of its own
    with BuildSketch(Plane(origin=(0, 0, 0), x_dir=(1, 0, 0), z_dir=(0, 1, 0))):
        with Locations((28, 42.45)):
            Circle(SKETCH19_R_2)
    extrude(amount=-CUT_EXTRUDE15_DEPTH, mode=Mode.SUBTRACT)

    # Sketch20 → Cut-Extrude16 (cut, through all)
    with BuildSketch(Plane(origin=(0, -3, 0), x_dir=(1, 0, 0), z_dir=(0, 1, 0))):
        with Locations(Location((13, 24.45, 0), (0, 0, 270))):
            Circle(SKETCH20_R)
        with Locations(Location((28, 24.45, 0), (0, 0, 270))):
            Circle(SKETCH20_R)
        with Locations(Location((28, 42.45, 0), (0, 0, 270))):
            Circle(SKETCH20_R)
    extrude(amount=-CUT_EXTRUDE16_DEPTH, mode=Mode.SUBTRACT)


with BuildPart() as body_3:
    # Mirror2: mirrored copy
    add(body_2.part.mirror(Plane.XY.offset(-33.45)))


solid = Compound([body_2.part, part_1.part, body_3.part])
